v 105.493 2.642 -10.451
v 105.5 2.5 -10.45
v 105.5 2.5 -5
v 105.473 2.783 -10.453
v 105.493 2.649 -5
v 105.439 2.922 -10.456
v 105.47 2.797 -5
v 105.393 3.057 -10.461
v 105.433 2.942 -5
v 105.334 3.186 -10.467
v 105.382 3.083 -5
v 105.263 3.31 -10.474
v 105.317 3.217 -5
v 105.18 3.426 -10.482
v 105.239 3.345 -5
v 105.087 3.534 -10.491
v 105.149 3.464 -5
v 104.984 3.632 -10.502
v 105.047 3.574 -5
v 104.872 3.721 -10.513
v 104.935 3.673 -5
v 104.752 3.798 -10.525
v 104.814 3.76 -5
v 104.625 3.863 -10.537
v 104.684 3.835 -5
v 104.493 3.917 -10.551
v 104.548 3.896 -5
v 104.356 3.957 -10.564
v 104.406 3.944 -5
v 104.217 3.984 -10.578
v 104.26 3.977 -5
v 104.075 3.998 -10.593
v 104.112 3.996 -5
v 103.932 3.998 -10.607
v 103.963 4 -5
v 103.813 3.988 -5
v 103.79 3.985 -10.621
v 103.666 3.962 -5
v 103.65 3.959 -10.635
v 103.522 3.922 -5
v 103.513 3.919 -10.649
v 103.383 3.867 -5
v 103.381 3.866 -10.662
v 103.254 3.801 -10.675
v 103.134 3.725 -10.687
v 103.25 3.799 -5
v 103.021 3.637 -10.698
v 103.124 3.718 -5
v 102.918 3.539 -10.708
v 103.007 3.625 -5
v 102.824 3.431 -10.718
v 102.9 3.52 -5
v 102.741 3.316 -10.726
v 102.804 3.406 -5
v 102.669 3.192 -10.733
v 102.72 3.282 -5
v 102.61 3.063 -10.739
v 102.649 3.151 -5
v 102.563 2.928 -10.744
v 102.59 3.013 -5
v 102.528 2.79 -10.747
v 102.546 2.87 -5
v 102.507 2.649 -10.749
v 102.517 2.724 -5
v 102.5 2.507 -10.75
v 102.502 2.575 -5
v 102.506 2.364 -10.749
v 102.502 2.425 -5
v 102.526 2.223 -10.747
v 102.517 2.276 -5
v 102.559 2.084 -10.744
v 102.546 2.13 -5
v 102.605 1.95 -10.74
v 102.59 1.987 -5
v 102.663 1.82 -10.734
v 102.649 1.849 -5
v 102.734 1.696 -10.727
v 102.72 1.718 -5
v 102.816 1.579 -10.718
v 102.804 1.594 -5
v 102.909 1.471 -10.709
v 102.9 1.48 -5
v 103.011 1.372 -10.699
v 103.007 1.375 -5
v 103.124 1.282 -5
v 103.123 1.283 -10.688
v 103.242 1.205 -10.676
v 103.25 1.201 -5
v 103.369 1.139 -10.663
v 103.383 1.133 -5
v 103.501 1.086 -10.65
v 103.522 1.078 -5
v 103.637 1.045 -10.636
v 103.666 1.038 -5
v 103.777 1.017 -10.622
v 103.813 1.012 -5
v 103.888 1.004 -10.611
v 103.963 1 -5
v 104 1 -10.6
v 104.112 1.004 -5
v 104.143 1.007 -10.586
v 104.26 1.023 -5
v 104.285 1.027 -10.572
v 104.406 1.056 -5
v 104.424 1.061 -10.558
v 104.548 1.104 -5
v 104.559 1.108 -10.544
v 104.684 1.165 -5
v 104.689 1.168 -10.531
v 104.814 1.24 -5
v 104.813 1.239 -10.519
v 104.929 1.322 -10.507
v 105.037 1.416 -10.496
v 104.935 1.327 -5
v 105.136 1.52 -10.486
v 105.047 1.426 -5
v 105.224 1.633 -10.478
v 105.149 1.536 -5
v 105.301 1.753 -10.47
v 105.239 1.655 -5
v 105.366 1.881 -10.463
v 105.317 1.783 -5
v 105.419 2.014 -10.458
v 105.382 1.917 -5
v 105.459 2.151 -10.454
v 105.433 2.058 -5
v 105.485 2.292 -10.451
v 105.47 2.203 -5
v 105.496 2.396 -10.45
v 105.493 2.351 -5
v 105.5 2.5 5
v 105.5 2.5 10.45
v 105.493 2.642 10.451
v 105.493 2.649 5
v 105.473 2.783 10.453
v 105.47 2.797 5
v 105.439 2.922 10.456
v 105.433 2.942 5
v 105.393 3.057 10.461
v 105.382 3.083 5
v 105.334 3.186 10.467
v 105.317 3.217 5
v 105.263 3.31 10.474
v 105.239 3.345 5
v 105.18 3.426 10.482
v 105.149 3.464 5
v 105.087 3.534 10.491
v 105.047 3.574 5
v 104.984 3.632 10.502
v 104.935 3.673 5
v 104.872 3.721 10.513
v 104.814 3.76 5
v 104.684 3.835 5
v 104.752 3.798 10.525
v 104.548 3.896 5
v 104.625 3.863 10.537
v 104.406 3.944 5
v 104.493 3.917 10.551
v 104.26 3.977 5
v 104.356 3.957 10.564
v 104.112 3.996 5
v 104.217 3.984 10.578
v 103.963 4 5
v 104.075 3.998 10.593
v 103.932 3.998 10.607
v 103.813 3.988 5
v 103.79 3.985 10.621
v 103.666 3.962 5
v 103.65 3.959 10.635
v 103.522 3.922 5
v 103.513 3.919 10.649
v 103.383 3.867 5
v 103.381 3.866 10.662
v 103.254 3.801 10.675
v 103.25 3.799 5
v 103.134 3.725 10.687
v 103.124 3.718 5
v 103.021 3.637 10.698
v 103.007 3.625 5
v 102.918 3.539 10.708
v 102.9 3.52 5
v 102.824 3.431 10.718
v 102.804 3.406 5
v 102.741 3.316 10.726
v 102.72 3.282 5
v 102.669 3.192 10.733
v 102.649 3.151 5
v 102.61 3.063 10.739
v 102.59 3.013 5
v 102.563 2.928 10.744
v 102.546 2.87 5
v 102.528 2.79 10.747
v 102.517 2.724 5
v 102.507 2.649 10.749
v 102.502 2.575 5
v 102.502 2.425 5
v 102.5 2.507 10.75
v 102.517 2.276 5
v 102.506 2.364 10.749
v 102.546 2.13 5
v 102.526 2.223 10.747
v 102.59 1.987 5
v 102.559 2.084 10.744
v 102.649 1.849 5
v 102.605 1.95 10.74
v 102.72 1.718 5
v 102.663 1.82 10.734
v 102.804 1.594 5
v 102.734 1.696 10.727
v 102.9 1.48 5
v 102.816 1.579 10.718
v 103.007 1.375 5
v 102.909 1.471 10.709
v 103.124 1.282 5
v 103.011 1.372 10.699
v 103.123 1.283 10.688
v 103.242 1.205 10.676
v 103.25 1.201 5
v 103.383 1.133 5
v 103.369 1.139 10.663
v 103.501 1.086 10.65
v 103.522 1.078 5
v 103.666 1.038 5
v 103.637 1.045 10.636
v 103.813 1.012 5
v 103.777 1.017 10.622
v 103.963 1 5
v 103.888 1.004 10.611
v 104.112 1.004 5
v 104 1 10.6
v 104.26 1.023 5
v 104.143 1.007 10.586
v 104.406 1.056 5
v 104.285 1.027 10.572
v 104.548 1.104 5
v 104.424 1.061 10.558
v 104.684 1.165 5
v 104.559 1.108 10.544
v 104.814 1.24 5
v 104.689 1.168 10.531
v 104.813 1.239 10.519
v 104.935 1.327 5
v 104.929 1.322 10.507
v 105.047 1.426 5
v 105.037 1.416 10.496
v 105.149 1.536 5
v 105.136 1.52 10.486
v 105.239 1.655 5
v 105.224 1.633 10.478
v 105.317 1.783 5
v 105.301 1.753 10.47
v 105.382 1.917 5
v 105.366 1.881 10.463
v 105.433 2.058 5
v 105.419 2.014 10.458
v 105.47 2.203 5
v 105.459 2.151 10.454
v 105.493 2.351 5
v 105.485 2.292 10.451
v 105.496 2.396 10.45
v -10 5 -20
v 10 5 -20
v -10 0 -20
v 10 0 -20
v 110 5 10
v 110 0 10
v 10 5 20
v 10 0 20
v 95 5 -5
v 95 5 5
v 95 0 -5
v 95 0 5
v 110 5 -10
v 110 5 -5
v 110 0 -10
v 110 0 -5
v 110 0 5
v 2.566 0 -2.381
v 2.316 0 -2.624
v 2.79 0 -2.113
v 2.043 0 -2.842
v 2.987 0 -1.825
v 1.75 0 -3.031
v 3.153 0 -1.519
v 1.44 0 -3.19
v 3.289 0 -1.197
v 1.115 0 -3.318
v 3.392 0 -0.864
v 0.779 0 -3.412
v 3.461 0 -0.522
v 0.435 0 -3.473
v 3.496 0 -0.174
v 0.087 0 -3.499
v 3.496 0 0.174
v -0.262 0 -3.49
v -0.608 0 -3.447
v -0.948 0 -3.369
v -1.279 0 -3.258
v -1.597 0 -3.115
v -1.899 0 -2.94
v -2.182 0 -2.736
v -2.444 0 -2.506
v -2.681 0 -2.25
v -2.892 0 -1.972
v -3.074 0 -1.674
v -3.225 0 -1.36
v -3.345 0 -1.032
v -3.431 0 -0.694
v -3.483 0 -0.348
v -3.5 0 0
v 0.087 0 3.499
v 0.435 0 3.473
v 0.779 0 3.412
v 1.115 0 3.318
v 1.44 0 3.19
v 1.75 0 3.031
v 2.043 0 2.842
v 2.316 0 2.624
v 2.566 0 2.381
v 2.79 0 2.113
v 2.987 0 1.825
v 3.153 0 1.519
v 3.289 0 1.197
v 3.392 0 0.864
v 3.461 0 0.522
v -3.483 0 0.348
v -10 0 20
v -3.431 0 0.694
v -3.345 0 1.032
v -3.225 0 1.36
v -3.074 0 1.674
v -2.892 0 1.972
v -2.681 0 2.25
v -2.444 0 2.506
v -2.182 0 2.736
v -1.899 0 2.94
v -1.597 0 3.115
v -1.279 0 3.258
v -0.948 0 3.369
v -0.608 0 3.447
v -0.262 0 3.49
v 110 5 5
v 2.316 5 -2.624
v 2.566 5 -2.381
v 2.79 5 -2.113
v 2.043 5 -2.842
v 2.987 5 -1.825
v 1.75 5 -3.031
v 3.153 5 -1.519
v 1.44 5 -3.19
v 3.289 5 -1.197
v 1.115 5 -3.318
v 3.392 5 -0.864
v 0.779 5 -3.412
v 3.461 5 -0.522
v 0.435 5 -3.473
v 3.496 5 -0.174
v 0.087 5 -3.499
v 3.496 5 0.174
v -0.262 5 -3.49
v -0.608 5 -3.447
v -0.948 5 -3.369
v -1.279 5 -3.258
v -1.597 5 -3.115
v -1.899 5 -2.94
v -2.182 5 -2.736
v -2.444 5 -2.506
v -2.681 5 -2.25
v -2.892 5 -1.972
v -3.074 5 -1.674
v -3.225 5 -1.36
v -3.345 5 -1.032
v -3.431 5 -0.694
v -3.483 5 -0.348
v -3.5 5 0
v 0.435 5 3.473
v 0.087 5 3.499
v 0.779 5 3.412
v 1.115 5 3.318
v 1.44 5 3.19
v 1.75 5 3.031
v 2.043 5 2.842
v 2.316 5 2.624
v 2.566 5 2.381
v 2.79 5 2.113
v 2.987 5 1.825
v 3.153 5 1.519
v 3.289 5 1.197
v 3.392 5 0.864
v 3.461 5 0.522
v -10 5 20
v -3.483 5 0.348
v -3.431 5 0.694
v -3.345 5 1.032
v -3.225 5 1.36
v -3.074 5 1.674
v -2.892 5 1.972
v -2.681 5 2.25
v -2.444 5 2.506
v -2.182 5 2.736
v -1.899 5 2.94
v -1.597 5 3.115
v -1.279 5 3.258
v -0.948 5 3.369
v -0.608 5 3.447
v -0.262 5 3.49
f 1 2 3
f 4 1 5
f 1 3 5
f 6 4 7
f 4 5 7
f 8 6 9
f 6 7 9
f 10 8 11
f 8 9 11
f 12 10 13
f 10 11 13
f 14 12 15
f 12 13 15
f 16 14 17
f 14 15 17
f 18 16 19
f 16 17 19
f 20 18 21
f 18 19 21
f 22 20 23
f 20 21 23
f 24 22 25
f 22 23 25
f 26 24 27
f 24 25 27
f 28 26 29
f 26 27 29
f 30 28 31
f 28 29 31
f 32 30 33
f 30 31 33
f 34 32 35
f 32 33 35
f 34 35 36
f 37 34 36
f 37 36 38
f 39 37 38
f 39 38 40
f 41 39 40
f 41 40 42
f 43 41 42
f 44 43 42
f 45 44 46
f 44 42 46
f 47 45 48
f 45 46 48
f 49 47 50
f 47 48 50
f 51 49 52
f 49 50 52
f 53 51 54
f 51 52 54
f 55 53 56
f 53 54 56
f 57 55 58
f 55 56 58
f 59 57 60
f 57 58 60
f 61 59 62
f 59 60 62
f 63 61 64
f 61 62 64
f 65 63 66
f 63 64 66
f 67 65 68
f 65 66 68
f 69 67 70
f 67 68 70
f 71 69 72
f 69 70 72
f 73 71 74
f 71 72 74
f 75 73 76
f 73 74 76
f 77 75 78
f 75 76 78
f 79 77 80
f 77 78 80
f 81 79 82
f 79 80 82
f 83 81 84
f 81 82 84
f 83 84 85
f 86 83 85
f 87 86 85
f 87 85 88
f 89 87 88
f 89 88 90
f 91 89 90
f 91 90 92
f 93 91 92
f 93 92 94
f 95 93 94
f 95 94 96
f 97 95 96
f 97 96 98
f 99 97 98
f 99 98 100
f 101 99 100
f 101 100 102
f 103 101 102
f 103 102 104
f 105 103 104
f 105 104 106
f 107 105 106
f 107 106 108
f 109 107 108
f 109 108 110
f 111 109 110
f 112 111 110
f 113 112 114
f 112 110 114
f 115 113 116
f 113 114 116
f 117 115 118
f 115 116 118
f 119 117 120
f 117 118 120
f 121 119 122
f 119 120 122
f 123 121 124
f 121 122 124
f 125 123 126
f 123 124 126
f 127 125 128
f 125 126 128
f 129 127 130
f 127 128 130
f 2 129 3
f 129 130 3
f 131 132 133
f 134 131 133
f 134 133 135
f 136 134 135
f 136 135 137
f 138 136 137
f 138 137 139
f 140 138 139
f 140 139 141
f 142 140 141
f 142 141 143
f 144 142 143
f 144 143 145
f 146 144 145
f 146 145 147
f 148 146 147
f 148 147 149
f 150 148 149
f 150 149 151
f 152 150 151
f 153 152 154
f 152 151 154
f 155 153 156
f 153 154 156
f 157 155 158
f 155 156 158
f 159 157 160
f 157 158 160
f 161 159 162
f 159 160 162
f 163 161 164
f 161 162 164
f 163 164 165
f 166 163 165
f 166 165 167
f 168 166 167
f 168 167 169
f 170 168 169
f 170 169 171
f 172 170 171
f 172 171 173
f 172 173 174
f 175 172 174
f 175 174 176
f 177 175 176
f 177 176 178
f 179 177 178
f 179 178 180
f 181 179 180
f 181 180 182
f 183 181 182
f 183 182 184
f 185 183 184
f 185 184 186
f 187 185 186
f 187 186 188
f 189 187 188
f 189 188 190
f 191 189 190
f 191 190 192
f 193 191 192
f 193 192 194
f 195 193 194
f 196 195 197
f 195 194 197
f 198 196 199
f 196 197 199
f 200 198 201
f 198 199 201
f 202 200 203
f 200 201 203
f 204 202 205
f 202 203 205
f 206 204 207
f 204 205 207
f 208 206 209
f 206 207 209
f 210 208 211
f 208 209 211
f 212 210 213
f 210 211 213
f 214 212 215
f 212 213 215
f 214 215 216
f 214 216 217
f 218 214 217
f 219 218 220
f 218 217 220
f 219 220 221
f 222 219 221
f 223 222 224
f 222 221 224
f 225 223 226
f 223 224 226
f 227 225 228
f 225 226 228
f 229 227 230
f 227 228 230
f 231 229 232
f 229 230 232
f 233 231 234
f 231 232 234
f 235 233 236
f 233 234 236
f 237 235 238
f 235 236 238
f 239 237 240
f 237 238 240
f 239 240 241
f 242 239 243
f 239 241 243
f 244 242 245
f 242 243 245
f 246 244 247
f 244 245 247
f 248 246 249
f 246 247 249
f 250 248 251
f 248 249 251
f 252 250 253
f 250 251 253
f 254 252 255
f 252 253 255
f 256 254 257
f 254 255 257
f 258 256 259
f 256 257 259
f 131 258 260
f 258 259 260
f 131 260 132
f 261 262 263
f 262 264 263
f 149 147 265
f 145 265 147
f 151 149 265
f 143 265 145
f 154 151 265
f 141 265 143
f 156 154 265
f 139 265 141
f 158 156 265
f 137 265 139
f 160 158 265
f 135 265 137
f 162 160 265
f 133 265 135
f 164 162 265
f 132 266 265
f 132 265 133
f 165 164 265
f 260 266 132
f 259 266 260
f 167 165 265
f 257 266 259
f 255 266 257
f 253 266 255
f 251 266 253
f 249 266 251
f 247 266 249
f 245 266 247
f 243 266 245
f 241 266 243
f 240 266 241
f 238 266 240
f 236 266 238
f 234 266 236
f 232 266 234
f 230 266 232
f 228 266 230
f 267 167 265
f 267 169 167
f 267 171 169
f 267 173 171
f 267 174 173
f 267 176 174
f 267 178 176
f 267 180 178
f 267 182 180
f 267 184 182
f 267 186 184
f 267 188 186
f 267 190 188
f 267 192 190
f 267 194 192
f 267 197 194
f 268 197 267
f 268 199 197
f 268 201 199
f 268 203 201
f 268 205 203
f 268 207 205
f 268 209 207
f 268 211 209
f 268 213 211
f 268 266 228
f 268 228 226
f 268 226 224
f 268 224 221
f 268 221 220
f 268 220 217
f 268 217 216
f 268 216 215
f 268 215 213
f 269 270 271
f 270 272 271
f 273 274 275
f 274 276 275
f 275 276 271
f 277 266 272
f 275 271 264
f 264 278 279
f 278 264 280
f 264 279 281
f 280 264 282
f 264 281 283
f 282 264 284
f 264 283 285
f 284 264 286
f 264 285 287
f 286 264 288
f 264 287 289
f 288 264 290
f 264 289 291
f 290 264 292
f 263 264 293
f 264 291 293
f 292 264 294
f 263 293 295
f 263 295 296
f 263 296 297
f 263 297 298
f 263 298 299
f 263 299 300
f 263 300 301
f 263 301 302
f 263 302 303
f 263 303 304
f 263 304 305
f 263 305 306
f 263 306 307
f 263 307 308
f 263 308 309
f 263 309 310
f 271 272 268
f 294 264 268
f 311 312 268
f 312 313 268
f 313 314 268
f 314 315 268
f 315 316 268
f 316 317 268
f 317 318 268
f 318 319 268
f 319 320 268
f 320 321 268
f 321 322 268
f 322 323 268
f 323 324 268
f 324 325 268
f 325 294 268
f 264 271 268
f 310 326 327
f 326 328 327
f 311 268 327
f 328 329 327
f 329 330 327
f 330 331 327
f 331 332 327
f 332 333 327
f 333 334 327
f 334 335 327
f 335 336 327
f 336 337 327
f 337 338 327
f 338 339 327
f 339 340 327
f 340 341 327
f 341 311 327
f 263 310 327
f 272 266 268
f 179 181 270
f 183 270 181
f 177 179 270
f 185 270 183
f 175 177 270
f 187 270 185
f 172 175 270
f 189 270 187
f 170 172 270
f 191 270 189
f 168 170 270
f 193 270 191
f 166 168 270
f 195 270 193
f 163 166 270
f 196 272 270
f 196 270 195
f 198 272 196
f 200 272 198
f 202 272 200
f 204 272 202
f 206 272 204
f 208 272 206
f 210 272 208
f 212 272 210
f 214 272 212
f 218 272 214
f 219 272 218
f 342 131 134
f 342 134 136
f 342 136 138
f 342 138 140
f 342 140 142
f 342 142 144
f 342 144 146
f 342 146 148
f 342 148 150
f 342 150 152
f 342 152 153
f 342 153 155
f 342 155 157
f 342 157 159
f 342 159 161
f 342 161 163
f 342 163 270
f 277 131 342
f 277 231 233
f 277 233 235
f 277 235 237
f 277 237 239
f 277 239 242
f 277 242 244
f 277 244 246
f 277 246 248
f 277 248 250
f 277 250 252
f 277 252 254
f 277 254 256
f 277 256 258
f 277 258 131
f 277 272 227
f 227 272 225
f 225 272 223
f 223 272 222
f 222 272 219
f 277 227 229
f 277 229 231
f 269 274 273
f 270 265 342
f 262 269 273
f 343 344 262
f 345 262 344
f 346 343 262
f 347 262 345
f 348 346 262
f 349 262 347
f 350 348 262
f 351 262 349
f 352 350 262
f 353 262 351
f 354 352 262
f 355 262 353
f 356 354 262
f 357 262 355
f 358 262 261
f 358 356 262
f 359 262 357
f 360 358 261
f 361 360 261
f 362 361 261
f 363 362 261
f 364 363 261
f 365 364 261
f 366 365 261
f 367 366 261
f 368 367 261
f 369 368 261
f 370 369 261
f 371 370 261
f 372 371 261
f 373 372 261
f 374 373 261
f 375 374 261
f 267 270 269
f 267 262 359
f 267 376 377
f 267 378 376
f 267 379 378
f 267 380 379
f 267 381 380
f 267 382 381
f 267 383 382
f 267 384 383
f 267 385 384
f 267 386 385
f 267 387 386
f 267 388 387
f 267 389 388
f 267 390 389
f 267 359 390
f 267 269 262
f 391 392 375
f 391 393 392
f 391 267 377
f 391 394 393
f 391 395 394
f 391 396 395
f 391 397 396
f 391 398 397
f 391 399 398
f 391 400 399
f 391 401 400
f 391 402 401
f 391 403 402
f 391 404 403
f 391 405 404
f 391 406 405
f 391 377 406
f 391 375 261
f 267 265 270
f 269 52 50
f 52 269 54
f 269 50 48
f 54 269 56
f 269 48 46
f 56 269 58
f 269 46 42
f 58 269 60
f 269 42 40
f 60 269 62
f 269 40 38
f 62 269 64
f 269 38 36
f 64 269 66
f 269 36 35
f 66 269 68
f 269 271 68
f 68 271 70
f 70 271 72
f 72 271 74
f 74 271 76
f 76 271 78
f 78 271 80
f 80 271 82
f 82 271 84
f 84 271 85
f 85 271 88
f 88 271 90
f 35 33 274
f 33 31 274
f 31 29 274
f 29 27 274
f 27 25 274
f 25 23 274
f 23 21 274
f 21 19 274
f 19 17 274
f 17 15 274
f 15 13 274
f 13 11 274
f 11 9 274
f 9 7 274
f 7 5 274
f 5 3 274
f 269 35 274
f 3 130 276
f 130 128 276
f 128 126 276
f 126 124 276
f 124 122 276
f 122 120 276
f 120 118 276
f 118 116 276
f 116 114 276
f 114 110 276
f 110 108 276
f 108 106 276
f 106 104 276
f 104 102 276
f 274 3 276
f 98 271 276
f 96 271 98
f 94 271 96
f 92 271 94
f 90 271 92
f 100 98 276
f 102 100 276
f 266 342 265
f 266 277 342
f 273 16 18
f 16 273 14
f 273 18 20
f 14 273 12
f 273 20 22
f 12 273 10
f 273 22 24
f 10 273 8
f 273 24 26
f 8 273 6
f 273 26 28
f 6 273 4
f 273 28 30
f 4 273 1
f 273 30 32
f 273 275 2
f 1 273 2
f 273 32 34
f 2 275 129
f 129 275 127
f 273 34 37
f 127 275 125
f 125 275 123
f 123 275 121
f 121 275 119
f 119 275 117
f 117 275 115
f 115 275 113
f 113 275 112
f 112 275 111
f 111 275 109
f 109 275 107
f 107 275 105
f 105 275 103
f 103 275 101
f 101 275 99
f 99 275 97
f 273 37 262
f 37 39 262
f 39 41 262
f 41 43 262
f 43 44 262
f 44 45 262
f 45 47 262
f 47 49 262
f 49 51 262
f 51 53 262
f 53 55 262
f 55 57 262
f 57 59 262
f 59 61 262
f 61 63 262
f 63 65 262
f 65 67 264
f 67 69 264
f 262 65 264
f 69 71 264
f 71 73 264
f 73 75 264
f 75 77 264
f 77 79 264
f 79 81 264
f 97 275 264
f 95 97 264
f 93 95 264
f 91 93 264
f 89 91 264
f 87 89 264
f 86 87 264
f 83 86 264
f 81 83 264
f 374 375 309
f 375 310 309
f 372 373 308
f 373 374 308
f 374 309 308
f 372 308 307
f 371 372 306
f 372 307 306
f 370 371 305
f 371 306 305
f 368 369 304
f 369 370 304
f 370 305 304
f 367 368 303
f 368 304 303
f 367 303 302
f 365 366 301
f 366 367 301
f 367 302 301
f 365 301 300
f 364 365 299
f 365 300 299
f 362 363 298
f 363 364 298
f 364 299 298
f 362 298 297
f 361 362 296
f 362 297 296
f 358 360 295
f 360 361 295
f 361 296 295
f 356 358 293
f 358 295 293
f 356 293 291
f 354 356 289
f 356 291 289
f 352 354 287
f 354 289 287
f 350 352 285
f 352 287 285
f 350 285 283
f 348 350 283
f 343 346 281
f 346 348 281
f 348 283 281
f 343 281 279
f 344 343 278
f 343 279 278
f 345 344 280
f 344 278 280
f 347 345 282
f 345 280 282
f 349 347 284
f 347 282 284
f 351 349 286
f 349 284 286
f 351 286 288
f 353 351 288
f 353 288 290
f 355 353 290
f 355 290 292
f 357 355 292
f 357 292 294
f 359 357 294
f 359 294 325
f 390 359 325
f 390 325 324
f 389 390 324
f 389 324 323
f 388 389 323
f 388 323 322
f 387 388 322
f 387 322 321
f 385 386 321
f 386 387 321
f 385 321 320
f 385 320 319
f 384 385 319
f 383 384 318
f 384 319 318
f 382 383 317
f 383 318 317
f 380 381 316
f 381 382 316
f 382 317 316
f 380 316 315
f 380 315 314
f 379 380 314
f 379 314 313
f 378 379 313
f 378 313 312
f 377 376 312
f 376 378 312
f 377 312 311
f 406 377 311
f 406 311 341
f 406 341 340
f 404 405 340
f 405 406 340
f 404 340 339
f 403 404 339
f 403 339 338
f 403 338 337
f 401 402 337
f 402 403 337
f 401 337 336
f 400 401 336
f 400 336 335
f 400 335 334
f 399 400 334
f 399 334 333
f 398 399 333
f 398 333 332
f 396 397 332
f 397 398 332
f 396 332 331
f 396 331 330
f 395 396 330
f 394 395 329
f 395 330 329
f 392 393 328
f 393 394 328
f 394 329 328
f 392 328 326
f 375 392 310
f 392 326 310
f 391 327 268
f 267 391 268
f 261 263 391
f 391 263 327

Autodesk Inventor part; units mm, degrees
ref_plane "YZ Plane" through (0, 0, 0) normal (1, 0, 0) x (0, 1, 0)
ref_plane "XZ Plane" through (0, 0, 0) normal (0, 1, 0) x (-1, 0, 0)
ref_plane "XY Plane" through (0, 0, 0) normal (0, 0, 1) x (1, 0, 0)
sketch "草圖1" plane through (0, 0, 0) normal (0, 1, 0) x (-1, 0, 0)
  circle A0 centre (0, 0) radius 3.5
  line L0 (10, 20) -> (-10, 20)
  line L1 (-10, 20) -> (-10, -20)
  line L2 (-10, -20) -> (10, -20)
  line L3 (10, -20) -> (10, 20)
  line L4 (10, 20) -> (-10, -20) construction
  line L5 (-10, 20) -> (10, -20) construction
  line L6 (-95, 0) -> (-95, 5)
  line L7 (-95, 5) -> (-95, -5)
  line L8 (-95, -5) -> (-110, -5)
  line L9 (-110, -5) -> (-110, -10)
  line L10 (-110, -10) -> (-10, -20)
  line L11 (-95, -5) -> (-95, 5)
  line L12 (-95, 5) -> (-110, 5)
  line L13 (-110, 5) -> (-110, 10)
  line L14 (-110, 10) -> (-10, 20)
  dimension "d0" = 7
  dimension "d1" = 20
  dimension "d2" = 40
  dimension "d8" = 20
  dimension "d9" = 10
  dimension "d10" = 120
  dimension "d11" = 15
extrude "擠出1" add sketch "草圖1" along normal blind 5
sketch "草圖2" plane through (-10, 0, 20) normal (0, 0, 1) x (1, 0, 0)
  line L0 (20, 0) -> (120, 0) projected
  line L1 (120, 0) -> (114, 0)
  line L2 (114, 0) -> (114, 2.5)
  circle A0 centre (114, 2.5) radius 1.5
  point P0 (10, 0)
  dimension "d14" = 6
  dimension "d15" = 2.5
  dimension "d16" = 3
extrude "擠出2" cut sketch "草圖2" against normal through all
properties part number "4. 托板"
